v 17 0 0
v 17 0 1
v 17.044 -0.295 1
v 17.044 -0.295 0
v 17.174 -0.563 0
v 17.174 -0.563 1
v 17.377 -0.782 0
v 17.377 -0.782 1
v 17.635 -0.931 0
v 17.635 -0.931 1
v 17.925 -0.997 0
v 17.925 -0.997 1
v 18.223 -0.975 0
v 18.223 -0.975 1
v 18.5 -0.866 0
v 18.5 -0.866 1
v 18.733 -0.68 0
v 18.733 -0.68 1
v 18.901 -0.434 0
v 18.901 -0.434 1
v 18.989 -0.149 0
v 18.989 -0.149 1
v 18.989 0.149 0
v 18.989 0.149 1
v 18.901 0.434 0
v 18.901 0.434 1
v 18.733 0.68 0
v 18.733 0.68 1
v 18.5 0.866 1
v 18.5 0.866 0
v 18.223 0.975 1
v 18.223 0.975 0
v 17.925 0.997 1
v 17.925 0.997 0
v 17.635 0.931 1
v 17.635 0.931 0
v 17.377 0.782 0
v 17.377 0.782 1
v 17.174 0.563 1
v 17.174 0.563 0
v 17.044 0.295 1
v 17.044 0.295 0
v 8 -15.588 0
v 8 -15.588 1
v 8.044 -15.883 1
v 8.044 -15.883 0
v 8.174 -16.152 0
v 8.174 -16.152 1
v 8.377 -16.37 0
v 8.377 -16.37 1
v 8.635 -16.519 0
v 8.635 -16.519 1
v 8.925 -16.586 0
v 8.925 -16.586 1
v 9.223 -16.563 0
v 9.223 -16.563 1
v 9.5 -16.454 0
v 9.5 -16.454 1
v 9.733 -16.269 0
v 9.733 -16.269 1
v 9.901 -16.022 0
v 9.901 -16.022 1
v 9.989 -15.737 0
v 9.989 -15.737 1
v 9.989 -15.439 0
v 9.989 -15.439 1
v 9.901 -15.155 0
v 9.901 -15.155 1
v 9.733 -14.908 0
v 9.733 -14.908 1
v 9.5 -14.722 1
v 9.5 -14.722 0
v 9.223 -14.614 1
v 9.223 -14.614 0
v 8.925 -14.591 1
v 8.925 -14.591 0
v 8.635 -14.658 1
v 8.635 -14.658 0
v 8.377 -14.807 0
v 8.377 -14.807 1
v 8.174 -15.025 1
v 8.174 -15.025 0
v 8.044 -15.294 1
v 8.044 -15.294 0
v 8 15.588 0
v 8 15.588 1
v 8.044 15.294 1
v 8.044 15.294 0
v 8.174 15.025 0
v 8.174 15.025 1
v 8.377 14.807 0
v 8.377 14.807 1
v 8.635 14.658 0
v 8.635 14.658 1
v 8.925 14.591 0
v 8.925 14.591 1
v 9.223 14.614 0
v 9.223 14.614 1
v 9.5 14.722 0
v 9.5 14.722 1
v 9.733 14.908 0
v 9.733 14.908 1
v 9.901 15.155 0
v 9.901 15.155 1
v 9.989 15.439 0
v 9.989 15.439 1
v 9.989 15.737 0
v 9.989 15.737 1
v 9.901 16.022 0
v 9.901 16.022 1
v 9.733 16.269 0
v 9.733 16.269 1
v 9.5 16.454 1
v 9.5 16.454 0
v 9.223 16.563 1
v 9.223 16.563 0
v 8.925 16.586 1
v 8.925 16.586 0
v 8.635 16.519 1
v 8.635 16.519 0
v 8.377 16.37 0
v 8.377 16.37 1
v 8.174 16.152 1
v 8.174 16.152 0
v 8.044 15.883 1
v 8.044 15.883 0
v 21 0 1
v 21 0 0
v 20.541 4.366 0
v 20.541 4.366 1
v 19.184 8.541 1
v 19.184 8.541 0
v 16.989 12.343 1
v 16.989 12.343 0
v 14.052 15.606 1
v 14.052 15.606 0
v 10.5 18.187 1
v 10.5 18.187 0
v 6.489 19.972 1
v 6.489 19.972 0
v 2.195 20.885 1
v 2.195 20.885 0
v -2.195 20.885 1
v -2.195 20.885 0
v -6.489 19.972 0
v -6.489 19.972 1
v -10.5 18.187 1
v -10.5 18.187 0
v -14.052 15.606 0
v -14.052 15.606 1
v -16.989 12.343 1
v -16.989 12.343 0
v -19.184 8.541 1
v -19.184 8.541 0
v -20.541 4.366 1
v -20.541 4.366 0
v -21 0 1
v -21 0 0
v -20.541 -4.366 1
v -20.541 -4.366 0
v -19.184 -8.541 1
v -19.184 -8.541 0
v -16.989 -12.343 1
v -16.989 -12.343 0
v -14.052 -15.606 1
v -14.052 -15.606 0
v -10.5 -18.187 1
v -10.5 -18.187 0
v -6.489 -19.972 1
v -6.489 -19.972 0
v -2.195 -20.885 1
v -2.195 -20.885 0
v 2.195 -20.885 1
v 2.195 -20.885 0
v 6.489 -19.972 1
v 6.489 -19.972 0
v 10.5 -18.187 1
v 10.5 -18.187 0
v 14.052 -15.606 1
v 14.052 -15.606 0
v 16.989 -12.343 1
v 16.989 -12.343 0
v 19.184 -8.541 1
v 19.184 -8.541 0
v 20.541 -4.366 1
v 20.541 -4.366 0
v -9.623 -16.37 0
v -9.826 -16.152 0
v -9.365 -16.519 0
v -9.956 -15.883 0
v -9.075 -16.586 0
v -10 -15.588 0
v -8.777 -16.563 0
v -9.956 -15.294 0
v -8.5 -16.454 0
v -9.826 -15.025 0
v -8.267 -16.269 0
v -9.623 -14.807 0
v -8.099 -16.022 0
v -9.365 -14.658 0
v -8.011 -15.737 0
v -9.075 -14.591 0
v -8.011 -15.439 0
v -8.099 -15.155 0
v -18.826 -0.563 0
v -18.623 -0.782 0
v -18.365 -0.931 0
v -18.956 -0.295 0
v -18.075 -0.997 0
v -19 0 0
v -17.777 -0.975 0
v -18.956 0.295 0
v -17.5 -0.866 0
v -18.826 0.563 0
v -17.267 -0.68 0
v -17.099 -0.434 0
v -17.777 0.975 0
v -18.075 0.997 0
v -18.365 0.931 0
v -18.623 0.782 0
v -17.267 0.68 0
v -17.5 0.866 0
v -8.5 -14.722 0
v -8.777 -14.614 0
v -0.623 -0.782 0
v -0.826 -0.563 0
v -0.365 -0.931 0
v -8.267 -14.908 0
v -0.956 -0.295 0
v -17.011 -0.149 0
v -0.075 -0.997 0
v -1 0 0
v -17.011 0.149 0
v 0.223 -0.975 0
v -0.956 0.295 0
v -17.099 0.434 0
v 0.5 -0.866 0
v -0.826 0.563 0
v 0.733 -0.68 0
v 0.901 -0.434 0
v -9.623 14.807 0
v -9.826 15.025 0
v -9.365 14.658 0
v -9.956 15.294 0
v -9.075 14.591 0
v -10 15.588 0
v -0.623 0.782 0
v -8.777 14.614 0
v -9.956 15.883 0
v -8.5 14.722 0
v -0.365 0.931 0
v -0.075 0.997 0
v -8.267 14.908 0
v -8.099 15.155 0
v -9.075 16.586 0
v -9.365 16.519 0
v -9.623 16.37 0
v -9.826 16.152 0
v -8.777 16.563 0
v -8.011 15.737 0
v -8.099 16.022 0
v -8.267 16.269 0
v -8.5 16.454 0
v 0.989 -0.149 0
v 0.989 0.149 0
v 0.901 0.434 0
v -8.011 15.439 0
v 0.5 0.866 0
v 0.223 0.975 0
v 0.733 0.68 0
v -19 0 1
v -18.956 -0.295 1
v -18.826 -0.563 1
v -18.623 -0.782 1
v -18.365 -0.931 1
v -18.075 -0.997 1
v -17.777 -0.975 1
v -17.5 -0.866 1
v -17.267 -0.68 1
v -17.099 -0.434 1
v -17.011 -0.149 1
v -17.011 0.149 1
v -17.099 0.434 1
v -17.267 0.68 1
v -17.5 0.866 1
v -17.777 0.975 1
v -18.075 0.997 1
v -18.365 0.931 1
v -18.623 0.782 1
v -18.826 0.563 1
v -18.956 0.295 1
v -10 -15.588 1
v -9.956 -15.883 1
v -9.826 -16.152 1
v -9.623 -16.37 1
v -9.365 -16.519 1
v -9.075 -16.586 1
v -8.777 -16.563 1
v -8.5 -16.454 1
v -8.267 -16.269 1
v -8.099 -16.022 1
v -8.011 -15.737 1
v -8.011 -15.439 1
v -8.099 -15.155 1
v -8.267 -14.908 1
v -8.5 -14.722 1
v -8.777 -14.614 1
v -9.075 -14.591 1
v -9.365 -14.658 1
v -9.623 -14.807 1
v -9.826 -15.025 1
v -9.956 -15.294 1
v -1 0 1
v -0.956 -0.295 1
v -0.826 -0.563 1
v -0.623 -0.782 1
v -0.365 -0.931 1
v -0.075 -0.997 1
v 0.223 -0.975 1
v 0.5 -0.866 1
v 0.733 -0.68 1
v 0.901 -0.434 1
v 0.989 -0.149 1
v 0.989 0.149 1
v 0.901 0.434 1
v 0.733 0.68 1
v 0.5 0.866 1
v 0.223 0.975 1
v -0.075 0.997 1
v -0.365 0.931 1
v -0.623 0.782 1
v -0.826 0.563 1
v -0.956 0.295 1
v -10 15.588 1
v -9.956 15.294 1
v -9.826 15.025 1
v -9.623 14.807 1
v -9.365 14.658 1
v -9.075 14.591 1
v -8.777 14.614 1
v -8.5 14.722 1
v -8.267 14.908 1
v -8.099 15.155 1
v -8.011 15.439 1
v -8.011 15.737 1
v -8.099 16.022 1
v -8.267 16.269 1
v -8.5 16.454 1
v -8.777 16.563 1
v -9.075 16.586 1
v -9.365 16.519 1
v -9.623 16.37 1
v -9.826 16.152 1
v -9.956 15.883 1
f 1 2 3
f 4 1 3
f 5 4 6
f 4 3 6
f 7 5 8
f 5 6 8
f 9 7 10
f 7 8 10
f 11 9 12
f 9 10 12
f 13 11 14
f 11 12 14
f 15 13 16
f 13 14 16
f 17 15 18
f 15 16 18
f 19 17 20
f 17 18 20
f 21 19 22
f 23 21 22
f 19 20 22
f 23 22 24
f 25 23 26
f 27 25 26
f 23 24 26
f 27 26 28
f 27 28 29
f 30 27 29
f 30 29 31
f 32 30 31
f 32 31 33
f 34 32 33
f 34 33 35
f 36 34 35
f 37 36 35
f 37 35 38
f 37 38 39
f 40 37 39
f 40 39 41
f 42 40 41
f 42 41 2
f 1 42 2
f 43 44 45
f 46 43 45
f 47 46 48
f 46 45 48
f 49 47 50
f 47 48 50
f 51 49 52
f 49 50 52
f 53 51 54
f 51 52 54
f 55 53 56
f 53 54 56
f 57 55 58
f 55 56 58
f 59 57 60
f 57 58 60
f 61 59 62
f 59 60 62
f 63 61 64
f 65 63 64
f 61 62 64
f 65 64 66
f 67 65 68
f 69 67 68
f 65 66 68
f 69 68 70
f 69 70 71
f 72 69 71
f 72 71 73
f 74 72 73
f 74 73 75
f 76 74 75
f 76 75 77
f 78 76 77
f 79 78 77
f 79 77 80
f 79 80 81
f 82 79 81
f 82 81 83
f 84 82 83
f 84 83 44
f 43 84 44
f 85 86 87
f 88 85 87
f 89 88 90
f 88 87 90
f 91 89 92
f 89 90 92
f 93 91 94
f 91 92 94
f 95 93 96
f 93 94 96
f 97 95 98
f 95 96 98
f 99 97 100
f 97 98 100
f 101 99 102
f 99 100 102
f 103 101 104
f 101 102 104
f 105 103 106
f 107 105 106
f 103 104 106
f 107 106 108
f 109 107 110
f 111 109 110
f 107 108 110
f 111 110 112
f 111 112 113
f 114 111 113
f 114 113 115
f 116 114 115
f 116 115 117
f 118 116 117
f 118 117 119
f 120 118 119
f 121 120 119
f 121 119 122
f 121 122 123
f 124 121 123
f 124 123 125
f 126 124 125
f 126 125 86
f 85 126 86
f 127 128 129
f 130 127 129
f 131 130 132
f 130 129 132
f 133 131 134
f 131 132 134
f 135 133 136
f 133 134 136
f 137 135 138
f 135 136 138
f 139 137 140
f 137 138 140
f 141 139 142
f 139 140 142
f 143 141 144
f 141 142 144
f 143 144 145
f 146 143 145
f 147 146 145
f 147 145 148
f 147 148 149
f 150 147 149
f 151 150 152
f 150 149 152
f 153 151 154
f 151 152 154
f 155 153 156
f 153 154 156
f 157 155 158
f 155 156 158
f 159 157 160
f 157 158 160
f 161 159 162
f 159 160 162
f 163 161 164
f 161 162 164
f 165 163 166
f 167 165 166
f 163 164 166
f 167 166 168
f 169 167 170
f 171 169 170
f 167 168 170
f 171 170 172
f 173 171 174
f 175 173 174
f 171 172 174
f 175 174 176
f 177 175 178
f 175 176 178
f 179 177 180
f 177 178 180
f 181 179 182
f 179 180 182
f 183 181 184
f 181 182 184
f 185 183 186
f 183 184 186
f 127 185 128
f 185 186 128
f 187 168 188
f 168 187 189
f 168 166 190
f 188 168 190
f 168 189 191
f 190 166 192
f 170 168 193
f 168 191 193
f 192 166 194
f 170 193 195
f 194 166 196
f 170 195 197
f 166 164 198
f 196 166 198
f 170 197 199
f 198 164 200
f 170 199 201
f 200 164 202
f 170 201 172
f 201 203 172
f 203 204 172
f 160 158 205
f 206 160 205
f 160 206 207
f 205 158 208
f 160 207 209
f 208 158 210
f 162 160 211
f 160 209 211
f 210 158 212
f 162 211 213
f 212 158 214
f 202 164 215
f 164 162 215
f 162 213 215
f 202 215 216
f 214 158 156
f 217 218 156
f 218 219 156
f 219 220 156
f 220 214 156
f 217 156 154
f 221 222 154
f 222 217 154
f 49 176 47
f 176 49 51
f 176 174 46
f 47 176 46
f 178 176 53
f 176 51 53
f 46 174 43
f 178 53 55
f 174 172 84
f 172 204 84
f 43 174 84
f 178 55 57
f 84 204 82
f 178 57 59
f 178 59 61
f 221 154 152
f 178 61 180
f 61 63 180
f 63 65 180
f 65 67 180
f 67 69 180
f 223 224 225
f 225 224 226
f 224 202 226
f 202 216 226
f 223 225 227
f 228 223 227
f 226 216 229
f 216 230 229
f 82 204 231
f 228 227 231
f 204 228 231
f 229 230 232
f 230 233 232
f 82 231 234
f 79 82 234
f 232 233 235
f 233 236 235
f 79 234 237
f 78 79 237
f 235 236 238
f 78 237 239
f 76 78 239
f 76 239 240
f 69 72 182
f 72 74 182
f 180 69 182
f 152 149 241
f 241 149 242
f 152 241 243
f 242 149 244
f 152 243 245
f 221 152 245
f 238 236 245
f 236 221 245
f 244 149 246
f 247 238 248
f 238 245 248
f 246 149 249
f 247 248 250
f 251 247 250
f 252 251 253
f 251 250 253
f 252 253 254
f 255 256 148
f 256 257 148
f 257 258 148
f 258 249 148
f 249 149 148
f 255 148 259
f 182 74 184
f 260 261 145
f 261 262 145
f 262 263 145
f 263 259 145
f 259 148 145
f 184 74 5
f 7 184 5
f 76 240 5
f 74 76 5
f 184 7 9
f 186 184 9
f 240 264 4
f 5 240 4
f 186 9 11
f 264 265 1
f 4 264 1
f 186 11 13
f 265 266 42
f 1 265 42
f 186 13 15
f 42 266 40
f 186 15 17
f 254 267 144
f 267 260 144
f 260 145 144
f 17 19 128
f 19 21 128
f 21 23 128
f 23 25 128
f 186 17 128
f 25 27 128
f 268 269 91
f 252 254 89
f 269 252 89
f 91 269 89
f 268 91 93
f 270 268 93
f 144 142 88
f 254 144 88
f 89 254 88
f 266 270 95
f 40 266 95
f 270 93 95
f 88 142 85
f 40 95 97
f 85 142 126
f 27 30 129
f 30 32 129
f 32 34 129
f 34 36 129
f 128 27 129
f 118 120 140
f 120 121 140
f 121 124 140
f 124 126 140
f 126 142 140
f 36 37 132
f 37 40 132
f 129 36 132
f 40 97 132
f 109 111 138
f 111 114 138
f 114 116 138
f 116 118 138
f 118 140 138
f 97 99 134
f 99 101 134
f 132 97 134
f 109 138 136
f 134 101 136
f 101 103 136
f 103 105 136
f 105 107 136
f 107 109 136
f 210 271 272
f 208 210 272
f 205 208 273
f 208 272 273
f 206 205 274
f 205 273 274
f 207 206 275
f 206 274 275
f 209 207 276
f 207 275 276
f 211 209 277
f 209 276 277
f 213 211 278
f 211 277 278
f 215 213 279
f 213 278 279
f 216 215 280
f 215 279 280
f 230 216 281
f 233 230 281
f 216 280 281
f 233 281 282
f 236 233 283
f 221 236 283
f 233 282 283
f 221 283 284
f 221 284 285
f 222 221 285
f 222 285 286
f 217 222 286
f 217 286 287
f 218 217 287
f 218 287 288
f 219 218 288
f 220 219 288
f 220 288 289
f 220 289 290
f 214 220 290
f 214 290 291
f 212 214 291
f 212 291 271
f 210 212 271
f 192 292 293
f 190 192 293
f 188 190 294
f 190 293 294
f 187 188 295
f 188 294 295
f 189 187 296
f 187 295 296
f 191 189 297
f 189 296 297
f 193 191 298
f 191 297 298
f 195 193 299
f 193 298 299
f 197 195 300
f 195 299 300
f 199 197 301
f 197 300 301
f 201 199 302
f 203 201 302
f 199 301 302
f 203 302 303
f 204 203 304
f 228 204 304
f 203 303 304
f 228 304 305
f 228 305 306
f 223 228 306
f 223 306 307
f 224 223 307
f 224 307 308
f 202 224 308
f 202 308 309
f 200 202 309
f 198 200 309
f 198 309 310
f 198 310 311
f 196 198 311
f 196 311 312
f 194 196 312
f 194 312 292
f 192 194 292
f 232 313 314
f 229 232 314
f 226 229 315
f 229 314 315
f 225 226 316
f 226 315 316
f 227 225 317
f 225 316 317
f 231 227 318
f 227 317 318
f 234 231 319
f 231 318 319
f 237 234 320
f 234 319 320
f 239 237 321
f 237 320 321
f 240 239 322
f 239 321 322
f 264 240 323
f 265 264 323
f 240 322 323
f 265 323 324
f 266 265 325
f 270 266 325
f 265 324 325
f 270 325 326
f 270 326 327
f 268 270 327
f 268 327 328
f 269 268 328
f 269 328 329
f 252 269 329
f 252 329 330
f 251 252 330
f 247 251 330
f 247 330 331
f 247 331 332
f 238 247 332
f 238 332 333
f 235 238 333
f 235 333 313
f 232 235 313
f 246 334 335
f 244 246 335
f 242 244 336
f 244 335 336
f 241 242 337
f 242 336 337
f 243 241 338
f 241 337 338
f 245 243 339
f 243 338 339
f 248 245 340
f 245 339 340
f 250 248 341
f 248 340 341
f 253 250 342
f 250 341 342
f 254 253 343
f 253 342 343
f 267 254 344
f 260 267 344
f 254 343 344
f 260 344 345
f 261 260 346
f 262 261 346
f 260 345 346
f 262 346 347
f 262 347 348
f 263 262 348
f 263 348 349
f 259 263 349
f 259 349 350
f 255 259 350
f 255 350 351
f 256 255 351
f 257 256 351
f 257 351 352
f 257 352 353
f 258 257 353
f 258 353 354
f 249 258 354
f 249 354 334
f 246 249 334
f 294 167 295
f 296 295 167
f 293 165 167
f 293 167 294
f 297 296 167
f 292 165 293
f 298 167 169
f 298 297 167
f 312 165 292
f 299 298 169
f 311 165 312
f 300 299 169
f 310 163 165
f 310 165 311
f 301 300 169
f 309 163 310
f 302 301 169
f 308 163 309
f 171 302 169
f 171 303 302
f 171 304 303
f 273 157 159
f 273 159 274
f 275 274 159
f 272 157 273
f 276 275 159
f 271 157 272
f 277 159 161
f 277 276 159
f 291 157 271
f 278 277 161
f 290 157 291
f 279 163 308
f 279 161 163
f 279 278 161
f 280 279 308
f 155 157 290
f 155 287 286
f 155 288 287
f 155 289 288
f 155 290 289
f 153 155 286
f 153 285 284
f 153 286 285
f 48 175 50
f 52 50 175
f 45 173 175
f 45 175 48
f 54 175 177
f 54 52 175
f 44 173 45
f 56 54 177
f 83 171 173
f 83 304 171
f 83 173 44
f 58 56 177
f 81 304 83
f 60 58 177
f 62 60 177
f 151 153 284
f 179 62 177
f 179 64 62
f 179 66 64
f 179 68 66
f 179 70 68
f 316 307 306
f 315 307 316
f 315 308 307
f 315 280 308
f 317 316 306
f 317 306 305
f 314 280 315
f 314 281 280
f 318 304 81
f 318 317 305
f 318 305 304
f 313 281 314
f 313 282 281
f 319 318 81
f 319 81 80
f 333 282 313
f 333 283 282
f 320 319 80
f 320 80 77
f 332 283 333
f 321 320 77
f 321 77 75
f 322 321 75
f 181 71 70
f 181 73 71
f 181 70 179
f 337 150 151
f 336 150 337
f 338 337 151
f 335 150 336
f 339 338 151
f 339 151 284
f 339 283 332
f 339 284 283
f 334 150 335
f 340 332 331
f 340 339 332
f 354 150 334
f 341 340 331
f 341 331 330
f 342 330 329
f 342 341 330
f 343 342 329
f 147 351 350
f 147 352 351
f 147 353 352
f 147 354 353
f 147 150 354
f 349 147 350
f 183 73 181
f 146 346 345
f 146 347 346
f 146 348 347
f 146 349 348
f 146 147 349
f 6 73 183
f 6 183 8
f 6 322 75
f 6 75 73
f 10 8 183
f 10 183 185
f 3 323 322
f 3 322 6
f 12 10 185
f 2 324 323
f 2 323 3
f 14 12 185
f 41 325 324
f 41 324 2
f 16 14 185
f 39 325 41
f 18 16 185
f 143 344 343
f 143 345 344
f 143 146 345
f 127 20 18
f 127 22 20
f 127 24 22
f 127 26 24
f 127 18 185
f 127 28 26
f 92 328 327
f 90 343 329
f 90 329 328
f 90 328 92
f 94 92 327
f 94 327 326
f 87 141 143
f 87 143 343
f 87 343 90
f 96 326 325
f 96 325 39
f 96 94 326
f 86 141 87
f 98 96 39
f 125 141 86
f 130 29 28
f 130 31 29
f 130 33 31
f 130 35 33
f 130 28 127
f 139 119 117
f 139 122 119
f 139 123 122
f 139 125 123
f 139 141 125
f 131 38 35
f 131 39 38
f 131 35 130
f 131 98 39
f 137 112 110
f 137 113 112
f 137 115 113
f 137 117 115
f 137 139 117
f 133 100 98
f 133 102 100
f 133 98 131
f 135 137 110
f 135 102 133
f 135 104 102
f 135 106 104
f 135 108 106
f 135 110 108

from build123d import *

# Parameters (mm, degrees)
F0_R     = 21
F1_DEPTH = 1
F2_D     = 2


# Not quite as in the source:
# - a feature names something its author has since deleted; it is built from what else it names


with BuildPart() as f1:
    # F0 (on Top) → F1 (new body)
    with BuildSketch(Plane.XY):
        Circle(F0_R)
    extrude(amount=F1_DEPTH)

    # F2 (through all)
    with Locations(Plane(origin=(0, 0, 0), x_dir=(1, 0, 0), z_dir=(0, 0, -1))):
        with Locations((-18, 0), (18, 0), (0, 0), (-9, 15.5884572681), (9, 15.5884572681), (9, -15.5884572681), (-9, -15.5884572681)):
            Hole(F2_D / 2)


solid = f1.part
